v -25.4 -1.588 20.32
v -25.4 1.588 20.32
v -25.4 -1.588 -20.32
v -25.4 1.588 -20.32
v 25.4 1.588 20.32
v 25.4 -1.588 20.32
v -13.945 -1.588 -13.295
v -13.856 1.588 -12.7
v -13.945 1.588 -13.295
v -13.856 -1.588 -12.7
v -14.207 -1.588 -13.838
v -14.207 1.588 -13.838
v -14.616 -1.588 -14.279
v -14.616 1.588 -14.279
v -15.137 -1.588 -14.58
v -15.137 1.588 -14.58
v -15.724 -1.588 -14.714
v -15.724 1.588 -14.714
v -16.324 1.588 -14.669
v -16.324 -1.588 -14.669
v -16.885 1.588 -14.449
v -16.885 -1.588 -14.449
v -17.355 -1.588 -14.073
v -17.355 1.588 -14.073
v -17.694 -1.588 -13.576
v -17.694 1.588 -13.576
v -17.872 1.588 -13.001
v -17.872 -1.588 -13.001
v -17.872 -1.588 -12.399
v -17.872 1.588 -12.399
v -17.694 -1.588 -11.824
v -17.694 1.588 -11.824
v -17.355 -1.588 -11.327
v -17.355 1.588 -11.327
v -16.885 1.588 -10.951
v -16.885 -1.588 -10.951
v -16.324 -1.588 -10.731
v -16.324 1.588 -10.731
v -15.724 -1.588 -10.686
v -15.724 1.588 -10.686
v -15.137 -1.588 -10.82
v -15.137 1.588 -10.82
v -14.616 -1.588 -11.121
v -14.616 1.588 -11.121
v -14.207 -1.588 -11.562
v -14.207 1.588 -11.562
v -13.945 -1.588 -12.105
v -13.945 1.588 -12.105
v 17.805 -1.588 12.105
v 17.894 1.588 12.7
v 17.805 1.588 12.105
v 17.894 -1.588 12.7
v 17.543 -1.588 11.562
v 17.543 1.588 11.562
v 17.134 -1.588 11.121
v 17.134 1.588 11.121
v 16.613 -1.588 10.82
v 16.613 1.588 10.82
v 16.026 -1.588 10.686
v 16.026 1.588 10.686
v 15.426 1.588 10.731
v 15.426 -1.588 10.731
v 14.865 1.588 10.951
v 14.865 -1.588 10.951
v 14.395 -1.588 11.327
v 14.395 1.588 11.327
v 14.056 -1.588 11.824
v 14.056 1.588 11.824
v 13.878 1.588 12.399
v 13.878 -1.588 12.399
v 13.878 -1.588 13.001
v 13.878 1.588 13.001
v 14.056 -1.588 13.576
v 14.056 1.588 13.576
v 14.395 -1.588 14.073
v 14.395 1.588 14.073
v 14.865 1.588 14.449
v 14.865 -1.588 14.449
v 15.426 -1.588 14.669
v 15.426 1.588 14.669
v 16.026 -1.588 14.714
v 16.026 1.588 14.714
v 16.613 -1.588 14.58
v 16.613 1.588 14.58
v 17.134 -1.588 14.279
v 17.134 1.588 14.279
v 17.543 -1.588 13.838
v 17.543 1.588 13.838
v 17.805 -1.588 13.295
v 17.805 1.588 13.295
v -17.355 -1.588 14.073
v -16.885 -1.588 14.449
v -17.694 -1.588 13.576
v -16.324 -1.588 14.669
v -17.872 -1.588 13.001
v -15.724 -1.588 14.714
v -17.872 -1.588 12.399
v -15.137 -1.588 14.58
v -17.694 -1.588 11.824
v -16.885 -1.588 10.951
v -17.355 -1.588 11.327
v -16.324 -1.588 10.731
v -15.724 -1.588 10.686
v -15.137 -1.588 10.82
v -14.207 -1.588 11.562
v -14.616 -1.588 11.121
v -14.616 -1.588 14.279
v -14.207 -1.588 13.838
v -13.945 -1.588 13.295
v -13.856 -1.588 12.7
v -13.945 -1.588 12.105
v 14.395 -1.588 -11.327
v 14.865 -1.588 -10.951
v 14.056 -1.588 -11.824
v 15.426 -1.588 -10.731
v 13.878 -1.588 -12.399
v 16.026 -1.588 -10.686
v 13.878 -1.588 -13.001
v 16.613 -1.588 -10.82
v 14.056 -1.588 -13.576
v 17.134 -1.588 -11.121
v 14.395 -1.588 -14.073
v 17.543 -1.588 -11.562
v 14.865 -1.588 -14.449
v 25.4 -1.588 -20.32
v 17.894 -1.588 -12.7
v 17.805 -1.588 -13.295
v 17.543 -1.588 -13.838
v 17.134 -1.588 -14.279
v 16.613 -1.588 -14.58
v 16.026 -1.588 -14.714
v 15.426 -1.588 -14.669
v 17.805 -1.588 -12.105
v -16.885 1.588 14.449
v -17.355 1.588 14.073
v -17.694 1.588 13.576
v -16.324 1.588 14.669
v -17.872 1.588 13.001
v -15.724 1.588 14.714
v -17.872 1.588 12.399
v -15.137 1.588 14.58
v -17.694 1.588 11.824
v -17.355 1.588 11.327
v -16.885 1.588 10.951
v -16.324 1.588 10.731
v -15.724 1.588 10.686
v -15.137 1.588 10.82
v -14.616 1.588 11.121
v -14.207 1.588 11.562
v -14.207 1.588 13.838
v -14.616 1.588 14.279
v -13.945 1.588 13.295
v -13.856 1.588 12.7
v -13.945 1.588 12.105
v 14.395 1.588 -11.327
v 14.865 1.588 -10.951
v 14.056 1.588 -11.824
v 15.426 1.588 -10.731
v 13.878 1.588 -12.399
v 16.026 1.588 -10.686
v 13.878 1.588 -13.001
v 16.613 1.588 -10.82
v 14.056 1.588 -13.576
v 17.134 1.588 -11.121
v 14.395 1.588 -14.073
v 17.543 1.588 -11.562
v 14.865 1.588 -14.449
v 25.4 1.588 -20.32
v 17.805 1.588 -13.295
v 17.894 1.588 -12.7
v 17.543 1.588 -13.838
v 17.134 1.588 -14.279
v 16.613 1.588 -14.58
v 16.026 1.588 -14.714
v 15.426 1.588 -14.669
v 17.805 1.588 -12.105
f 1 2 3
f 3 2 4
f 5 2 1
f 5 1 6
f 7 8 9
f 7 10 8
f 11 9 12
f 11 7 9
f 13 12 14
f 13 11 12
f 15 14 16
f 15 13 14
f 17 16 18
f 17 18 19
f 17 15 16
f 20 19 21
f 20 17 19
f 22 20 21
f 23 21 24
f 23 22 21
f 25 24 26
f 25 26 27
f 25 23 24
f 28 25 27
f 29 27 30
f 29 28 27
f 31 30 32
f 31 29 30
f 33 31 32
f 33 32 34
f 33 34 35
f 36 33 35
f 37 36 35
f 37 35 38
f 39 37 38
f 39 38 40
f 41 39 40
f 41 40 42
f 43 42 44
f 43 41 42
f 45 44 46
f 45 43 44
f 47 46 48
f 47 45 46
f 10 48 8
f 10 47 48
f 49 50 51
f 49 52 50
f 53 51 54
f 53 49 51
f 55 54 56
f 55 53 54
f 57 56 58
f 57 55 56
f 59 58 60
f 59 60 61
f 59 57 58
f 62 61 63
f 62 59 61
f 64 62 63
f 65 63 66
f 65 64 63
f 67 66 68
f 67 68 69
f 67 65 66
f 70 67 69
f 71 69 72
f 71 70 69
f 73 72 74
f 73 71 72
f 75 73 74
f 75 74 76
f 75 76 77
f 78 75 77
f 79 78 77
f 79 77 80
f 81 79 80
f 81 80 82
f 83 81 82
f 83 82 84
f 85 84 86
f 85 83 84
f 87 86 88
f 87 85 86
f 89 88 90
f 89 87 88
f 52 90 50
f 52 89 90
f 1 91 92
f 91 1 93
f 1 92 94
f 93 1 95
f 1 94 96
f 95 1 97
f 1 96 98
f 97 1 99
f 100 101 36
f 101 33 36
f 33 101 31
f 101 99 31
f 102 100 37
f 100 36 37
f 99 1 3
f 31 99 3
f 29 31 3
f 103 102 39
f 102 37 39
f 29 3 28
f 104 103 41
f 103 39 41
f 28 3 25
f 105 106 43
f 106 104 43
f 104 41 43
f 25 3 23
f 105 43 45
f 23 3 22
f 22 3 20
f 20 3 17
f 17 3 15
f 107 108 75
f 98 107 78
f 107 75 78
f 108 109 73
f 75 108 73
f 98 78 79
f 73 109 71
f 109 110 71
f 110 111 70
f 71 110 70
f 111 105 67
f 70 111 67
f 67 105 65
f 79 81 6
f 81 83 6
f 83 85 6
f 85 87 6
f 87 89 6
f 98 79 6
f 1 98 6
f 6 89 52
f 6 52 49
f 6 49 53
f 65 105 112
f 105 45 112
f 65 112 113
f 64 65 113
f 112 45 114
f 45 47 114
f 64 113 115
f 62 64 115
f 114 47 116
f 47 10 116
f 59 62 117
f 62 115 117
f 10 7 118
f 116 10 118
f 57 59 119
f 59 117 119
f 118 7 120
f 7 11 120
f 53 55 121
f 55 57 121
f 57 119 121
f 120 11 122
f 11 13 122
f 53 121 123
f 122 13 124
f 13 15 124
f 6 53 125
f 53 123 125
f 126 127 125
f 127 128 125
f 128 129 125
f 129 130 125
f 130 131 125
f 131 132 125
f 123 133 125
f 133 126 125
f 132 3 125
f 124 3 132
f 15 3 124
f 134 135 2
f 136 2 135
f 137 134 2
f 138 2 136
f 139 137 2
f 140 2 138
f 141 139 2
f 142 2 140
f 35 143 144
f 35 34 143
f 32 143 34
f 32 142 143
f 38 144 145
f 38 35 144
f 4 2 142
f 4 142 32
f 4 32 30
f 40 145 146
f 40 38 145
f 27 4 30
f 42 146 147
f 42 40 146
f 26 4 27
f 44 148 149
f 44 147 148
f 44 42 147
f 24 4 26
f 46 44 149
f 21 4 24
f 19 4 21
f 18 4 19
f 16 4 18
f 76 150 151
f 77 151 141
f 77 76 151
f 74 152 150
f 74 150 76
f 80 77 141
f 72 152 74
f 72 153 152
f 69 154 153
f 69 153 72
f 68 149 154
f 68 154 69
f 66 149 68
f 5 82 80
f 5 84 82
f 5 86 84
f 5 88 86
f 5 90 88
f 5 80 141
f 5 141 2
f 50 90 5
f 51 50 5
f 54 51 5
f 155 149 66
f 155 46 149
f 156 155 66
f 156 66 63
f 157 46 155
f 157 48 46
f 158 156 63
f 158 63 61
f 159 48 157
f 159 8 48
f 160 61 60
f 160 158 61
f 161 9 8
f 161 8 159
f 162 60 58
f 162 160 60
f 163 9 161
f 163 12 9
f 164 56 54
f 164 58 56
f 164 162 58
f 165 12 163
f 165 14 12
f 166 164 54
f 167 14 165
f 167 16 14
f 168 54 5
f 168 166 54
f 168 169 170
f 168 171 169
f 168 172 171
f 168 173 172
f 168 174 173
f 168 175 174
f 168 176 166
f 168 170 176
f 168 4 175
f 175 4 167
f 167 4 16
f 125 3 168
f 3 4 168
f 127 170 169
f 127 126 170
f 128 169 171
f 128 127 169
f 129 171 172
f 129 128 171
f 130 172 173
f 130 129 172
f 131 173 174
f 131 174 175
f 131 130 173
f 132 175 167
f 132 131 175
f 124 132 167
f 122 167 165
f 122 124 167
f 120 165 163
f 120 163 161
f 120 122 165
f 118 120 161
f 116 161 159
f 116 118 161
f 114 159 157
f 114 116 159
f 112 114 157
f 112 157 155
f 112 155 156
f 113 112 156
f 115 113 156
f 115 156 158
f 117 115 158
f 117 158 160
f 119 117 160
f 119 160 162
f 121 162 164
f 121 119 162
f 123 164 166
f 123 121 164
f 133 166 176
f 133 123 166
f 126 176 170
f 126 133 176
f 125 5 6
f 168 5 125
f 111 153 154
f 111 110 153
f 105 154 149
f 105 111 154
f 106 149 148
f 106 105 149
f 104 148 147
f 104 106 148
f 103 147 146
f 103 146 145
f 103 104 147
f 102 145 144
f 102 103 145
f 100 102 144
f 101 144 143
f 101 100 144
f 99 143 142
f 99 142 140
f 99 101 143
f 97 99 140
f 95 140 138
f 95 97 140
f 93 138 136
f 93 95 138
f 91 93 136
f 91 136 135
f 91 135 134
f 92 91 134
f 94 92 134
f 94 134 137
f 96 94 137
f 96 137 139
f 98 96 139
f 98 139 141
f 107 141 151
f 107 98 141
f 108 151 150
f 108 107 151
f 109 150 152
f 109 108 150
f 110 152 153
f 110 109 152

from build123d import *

# Parameters (mm, degrees)
SKETCH1_W           = 50.8
SKETCH1_H           = 40.64
SKETCH1_R           = 2.0193
BOSS_EXTRUDE1_DEPTH = 1.5875


with BuildPart() as part:
    # Sketch1 → Boss-Extrude1 (new body, symmetric)
    with BuildSketch(Plane(origin=(0, 0, 0), x_dir=(1, 0, 0), z_dir=(0, 1, 0))):
        Rectangle(SKETCH1_W, SKETCH1_H)
        with Locations((-15.875, 12.7)):
            Circle(SKETCH1_R, mode=Mode.SUBTRACT)
        with Locations((15.875, 12.7)):
            Circle(SKETCH1_R, mode=Mode.SUBTRACT)
        with Locations((15.875, -12.7)):
            Circle(SKETCH1_R, mode=Mode.SUBTRACT)
        with Locations((-15.875, -12.7)):
            Circle(SKETCH1_R, mode=Mode.SUBTRACT)
    extrude(amount=BOSS_EXTRUDE1_DEPTH, both=True)


solid = part.part
